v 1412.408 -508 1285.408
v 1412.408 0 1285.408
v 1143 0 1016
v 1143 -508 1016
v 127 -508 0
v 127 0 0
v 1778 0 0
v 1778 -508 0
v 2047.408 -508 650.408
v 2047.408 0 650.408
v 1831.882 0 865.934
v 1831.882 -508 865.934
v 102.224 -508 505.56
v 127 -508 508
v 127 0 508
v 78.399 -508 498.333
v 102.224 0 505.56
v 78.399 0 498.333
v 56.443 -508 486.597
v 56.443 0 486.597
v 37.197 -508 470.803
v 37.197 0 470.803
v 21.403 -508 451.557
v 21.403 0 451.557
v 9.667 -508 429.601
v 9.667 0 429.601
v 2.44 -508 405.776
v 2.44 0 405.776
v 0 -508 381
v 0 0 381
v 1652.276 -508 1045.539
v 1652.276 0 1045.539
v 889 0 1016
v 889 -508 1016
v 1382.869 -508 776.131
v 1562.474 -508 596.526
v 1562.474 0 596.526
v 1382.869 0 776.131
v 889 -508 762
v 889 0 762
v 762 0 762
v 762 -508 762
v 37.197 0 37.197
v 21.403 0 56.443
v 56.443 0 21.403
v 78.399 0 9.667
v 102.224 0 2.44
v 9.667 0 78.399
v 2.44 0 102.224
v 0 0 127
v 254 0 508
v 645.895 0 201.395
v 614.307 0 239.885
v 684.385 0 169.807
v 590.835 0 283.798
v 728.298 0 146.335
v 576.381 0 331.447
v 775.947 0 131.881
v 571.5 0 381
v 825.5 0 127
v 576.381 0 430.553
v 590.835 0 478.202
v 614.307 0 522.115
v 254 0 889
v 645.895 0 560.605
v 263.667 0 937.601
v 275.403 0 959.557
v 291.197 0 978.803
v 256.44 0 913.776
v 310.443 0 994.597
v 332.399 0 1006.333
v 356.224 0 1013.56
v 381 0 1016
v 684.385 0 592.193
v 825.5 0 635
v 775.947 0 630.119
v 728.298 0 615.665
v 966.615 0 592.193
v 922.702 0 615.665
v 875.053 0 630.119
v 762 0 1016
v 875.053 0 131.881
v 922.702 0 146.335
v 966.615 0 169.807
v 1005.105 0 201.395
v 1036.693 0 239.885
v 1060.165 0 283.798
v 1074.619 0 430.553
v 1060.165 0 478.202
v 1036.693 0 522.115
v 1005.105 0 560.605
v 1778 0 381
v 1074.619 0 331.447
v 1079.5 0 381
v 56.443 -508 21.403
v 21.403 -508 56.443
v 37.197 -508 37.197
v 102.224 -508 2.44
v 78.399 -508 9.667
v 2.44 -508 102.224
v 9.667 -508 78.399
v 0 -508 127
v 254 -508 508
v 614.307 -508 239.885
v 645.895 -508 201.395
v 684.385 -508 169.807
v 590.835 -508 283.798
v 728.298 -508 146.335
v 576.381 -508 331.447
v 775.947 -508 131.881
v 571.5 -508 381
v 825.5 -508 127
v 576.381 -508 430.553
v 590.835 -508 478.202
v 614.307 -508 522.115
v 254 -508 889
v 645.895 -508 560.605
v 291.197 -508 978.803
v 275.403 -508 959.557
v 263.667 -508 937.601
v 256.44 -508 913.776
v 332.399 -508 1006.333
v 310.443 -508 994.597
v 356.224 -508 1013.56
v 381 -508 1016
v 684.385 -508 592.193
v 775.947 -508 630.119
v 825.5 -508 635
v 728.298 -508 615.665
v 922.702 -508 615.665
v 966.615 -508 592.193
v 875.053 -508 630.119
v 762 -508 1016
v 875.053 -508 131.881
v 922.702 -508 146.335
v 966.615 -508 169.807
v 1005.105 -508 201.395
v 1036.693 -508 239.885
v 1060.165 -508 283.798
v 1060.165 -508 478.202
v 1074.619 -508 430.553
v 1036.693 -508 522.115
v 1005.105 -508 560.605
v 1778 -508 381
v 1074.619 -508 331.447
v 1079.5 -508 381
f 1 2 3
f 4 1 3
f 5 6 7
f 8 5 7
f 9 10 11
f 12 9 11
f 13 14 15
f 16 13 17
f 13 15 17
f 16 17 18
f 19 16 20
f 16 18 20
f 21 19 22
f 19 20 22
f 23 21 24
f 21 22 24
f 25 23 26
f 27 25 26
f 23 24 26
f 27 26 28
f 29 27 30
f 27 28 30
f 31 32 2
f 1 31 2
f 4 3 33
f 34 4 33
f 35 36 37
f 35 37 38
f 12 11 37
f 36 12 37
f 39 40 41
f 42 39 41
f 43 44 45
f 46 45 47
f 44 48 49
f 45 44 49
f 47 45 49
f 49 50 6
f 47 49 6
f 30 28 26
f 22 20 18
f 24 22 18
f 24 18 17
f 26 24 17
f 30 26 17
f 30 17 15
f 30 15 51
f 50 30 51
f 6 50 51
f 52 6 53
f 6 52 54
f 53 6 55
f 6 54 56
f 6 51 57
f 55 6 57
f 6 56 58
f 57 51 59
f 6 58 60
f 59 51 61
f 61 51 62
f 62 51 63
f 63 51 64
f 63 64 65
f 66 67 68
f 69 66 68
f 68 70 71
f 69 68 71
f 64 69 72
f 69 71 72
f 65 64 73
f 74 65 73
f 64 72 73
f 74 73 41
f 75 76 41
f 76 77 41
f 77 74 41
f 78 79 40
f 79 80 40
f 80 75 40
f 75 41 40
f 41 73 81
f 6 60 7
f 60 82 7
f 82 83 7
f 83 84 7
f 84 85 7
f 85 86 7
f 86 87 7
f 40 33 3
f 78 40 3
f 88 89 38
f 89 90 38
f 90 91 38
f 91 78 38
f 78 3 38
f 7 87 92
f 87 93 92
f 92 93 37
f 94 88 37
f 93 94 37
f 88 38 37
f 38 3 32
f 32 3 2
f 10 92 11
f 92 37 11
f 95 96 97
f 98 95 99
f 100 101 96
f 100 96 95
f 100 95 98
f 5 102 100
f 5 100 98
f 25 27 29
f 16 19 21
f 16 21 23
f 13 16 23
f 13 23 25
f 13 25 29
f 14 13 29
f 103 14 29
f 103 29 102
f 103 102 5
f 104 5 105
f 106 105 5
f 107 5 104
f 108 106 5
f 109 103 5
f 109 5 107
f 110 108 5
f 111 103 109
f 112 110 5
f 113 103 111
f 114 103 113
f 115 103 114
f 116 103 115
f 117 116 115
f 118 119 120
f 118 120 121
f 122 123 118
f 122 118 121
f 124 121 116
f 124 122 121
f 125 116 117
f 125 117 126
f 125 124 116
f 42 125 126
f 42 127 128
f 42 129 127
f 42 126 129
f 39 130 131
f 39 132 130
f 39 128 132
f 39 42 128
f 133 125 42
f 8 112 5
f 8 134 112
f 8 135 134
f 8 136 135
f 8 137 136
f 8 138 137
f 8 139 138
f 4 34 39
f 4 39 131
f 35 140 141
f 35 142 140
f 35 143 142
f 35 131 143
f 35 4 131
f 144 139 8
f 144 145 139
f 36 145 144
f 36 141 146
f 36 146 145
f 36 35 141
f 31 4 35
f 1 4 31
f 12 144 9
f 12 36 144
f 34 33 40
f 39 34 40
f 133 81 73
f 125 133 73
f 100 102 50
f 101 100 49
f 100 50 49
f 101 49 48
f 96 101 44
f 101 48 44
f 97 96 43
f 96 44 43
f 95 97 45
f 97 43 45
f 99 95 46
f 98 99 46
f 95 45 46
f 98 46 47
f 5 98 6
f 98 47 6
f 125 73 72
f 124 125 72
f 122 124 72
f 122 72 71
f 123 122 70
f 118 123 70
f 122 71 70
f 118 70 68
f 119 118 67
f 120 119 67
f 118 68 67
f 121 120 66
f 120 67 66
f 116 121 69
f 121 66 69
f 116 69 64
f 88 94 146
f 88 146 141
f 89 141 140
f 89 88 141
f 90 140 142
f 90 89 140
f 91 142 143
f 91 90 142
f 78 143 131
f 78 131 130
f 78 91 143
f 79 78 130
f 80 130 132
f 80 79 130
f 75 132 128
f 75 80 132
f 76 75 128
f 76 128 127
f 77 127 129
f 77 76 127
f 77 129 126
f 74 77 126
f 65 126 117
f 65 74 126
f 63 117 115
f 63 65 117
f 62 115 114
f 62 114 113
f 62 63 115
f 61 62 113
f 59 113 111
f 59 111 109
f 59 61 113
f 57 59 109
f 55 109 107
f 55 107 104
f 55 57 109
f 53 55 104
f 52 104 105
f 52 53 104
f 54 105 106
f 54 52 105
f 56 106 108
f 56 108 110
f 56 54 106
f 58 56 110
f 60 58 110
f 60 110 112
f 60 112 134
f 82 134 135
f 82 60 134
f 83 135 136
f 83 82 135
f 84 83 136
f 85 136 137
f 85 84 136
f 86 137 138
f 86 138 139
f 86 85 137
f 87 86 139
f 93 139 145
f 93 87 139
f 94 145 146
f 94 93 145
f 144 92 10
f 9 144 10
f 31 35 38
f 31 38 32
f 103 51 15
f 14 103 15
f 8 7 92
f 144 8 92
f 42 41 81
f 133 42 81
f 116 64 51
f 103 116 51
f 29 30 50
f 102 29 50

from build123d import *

# Parameters (mm, degrees)
F0_R     = 254
F1_DEPTH = 508


with BuildPart() as f1:
    # F0 (on Front) → F1 (new body)
    with BuildSketch(Plane.XZ):
        with BuildLine():
            ThreePointArc((0, 127), (37.197439, 37.197439), (127, 0))
            Line((127, 0), (1778, 0))
            Line((1778, 0), (1778, 381))
            Line((1778, 381), (2047.407684, 650.407684))
            Line((2047.407684, 650.407684), (1831.881537, 865.933831))
            Line((1831.881537, 865.933831), (1562.473853, 596.526147))
            Line((1562.473853, 596.526147), (1382.868731, 776.131269))
            Line((1382.868731, 776.131269), (1652.276414, 1045.538953))
            Line((1652.276414, 1045.538953), (1412.407684, 1285.407684))
            Line((1412.407684, 1285.407684), (1143, 1016))
            Line((1143, 1016), (889, 1016))
            Line((889, 1016), (889, 762))
            Line((889, 762), (762, 762))
            Line((762, 762), (762, 1016))
            Line((762, 1016), (381, 1016))
            ThreePointArc((381, 1016), (291.197439, 978.802561), (254, 889))
            Line((254, 889), (254, 508))
            Line((254, 508), (127, 508))
            ThreePointArc((127, 508), (37.197439, 470.802561), (0, 381))
            Line((0, 381), (0, 127))
        make_face()
        with Locations((825.5, 381)):
            Circle(F0_R, mode=Mode.SUBTRACT)
    extrude(amount=F1_DEPTH)


solid = f1.part
